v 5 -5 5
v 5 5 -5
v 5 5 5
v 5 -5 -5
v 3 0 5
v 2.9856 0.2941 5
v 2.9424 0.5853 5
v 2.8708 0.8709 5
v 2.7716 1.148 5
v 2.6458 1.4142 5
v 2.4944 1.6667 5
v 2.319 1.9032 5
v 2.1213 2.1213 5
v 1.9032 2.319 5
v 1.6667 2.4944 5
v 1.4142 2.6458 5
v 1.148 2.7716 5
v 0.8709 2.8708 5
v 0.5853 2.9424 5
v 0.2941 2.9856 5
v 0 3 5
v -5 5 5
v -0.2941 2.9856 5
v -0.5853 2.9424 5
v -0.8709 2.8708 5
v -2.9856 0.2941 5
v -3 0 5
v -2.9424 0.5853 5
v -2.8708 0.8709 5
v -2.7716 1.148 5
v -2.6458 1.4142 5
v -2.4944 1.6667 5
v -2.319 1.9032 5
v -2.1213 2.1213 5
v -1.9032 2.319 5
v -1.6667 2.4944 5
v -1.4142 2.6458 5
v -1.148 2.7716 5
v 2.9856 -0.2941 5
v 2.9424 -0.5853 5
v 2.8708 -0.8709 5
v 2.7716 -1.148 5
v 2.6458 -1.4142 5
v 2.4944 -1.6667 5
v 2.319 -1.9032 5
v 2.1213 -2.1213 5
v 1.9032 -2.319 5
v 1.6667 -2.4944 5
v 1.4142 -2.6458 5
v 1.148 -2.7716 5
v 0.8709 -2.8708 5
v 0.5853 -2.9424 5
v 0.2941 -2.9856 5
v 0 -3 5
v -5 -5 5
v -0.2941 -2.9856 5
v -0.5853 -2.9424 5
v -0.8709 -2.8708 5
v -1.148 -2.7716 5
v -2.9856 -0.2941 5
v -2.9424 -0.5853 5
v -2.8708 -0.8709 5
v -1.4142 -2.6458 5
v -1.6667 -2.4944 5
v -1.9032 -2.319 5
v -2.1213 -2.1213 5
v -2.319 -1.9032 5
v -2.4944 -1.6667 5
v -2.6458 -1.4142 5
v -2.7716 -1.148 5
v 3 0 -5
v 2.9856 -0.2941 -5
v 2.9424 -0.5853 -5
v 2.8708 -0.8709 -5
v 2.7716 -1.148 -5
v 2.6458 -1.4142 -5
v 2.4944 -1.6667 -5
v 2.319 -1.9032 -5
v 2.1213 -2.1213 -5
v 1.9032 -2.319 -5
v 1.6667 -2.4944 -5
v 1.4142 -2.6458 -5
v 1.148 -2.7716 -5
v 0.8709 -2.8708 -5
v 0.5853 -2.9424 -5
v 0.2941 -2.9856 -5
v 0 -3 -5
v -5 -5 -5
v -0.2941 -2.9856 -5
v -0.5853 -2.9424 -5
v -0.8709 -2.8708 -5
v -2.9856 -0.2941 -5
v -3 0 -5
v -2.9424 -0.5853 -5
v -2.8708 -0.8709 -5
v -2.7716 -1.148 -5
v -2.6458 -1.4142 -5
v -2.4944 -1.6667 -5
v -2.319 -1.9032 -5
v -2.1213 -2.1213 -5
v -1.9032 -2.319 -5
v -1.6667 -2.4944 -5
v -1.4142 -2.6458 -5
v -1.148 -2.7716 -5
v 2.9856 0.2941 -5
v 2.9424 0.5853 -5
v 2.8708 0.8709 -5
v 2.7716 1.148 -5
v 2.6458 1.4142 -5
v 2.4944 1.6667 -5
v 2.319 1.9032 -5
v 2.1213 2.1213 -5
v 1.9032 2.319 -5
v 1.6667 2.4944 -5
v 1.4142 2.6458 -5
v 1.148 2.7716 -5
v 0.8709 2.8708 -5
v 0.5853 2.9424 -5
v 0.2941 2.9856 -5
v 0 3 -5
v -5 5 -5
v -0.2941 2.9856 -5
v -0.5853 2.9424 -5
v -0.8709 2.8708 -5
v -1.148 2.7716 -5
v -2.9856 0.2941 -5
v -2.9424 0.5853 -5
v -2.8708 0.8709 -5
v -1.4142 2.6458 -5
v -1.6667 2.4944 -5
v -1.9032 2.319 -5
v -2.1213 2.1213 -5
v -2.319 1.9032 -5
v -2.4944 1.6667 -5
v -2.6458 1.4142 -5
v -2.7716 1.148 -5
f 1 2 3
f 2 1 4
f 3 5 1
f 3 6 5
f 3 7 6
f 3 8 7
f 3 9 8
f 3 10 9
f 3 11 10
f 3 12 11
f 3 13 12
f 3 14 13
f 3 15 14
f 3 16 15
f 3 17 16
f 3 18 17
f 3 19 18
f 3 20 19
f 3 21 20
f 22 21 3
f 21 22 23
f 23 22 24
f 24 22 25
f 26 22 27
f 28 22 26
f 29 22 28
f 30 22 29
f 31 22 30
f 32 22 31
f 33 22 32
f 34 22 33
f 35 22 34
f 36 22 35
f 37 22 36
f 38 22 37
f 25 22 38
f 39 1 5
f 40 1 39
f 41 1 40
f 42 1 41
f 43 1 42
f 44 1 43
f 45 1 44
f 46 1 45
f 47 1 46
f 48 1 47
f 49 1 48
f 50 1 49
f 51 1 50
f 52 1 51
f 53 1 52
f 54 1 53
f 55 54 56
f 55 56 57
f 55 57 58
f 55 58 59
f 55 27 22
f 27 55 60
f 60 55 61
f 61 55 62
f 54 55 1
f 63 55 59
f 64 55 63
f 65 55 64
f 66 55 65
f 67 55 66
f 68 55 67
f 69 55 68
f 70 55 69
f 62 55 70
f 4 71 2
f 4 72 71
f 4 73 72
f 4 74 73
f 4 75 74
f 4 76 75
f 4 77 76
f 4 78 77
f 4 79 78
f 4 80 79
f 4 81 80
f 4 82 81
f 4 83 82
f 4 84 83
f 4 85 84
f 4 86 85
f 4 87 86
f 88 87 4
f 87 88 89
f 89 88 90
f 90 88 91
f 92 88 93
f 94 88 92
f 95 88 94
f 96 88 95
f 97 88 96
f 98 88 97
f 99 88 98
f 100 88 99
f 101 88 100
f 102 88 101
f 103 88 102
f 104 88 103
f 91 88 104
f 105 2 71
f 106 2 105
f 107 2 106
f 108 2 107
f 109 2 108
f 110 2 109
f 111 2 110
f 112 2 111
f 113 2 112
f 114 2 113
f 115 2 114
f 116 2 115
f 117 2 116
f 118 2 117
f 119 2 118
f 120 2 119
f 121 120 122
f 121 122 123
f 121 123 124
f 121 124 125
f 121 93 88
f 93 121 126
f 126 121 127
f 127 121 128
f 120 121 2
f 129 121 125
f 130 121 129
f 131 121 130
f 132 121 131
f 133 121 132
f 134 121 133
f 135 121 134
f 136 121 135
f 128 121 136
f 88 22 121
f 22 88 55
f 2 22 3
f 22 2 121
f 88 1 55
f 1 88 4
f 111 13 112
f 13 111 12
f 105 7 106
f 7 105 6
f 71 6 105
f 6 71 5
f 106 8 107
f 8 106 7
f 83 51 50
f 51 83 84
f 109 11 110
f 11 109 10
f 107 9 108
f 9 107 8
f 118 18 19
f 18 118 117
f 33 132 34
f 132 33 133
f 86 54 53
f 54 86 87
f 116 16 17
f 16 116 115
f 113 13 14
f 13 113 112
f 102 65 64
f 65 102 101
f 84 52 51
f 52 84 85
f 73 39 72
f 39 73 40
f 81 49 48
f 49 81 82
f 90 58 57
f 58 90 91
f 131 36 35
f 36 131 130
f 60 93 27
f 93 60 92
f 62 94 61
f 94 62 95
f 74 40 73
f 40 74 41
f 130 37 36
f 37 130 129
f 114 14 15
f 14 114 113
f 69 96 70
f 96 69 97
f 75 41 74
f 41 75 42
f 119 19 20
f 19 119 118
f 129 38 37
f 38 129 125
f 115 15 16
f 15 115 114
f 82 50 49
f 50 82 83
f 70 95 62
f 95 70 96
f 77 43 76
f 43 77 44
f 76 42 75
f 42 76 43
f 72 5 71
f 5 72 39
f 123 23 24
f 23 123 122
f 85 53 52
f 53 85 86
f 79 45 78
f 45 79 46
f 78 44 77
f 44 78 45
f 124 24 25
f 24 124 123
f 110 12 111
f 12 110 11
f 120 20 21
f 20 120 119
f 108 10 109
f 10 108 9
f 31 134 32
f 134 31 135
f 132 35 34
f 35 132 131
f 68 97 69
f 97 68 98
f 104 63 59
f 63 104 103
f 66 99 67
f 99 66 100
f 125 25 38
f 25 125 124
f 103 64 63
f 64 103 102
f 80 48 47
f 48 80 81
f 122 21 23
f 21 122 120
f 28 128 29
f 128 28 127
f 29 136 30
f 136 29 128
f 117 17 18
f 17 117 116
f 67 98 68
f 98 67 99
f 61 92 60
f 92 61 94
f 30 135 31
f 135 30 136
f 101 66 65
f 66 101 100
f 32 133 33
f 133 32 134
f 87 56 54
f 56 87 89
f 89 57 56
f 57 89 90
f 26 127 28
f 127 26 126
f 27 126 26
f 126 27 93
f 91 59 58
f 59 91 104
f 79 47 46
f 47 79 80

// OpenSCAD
$fn = 64;
difference() {
  cube([10, 10, 10], center = true);
  cylinder(h = 20, r = 3, center = true);
}
